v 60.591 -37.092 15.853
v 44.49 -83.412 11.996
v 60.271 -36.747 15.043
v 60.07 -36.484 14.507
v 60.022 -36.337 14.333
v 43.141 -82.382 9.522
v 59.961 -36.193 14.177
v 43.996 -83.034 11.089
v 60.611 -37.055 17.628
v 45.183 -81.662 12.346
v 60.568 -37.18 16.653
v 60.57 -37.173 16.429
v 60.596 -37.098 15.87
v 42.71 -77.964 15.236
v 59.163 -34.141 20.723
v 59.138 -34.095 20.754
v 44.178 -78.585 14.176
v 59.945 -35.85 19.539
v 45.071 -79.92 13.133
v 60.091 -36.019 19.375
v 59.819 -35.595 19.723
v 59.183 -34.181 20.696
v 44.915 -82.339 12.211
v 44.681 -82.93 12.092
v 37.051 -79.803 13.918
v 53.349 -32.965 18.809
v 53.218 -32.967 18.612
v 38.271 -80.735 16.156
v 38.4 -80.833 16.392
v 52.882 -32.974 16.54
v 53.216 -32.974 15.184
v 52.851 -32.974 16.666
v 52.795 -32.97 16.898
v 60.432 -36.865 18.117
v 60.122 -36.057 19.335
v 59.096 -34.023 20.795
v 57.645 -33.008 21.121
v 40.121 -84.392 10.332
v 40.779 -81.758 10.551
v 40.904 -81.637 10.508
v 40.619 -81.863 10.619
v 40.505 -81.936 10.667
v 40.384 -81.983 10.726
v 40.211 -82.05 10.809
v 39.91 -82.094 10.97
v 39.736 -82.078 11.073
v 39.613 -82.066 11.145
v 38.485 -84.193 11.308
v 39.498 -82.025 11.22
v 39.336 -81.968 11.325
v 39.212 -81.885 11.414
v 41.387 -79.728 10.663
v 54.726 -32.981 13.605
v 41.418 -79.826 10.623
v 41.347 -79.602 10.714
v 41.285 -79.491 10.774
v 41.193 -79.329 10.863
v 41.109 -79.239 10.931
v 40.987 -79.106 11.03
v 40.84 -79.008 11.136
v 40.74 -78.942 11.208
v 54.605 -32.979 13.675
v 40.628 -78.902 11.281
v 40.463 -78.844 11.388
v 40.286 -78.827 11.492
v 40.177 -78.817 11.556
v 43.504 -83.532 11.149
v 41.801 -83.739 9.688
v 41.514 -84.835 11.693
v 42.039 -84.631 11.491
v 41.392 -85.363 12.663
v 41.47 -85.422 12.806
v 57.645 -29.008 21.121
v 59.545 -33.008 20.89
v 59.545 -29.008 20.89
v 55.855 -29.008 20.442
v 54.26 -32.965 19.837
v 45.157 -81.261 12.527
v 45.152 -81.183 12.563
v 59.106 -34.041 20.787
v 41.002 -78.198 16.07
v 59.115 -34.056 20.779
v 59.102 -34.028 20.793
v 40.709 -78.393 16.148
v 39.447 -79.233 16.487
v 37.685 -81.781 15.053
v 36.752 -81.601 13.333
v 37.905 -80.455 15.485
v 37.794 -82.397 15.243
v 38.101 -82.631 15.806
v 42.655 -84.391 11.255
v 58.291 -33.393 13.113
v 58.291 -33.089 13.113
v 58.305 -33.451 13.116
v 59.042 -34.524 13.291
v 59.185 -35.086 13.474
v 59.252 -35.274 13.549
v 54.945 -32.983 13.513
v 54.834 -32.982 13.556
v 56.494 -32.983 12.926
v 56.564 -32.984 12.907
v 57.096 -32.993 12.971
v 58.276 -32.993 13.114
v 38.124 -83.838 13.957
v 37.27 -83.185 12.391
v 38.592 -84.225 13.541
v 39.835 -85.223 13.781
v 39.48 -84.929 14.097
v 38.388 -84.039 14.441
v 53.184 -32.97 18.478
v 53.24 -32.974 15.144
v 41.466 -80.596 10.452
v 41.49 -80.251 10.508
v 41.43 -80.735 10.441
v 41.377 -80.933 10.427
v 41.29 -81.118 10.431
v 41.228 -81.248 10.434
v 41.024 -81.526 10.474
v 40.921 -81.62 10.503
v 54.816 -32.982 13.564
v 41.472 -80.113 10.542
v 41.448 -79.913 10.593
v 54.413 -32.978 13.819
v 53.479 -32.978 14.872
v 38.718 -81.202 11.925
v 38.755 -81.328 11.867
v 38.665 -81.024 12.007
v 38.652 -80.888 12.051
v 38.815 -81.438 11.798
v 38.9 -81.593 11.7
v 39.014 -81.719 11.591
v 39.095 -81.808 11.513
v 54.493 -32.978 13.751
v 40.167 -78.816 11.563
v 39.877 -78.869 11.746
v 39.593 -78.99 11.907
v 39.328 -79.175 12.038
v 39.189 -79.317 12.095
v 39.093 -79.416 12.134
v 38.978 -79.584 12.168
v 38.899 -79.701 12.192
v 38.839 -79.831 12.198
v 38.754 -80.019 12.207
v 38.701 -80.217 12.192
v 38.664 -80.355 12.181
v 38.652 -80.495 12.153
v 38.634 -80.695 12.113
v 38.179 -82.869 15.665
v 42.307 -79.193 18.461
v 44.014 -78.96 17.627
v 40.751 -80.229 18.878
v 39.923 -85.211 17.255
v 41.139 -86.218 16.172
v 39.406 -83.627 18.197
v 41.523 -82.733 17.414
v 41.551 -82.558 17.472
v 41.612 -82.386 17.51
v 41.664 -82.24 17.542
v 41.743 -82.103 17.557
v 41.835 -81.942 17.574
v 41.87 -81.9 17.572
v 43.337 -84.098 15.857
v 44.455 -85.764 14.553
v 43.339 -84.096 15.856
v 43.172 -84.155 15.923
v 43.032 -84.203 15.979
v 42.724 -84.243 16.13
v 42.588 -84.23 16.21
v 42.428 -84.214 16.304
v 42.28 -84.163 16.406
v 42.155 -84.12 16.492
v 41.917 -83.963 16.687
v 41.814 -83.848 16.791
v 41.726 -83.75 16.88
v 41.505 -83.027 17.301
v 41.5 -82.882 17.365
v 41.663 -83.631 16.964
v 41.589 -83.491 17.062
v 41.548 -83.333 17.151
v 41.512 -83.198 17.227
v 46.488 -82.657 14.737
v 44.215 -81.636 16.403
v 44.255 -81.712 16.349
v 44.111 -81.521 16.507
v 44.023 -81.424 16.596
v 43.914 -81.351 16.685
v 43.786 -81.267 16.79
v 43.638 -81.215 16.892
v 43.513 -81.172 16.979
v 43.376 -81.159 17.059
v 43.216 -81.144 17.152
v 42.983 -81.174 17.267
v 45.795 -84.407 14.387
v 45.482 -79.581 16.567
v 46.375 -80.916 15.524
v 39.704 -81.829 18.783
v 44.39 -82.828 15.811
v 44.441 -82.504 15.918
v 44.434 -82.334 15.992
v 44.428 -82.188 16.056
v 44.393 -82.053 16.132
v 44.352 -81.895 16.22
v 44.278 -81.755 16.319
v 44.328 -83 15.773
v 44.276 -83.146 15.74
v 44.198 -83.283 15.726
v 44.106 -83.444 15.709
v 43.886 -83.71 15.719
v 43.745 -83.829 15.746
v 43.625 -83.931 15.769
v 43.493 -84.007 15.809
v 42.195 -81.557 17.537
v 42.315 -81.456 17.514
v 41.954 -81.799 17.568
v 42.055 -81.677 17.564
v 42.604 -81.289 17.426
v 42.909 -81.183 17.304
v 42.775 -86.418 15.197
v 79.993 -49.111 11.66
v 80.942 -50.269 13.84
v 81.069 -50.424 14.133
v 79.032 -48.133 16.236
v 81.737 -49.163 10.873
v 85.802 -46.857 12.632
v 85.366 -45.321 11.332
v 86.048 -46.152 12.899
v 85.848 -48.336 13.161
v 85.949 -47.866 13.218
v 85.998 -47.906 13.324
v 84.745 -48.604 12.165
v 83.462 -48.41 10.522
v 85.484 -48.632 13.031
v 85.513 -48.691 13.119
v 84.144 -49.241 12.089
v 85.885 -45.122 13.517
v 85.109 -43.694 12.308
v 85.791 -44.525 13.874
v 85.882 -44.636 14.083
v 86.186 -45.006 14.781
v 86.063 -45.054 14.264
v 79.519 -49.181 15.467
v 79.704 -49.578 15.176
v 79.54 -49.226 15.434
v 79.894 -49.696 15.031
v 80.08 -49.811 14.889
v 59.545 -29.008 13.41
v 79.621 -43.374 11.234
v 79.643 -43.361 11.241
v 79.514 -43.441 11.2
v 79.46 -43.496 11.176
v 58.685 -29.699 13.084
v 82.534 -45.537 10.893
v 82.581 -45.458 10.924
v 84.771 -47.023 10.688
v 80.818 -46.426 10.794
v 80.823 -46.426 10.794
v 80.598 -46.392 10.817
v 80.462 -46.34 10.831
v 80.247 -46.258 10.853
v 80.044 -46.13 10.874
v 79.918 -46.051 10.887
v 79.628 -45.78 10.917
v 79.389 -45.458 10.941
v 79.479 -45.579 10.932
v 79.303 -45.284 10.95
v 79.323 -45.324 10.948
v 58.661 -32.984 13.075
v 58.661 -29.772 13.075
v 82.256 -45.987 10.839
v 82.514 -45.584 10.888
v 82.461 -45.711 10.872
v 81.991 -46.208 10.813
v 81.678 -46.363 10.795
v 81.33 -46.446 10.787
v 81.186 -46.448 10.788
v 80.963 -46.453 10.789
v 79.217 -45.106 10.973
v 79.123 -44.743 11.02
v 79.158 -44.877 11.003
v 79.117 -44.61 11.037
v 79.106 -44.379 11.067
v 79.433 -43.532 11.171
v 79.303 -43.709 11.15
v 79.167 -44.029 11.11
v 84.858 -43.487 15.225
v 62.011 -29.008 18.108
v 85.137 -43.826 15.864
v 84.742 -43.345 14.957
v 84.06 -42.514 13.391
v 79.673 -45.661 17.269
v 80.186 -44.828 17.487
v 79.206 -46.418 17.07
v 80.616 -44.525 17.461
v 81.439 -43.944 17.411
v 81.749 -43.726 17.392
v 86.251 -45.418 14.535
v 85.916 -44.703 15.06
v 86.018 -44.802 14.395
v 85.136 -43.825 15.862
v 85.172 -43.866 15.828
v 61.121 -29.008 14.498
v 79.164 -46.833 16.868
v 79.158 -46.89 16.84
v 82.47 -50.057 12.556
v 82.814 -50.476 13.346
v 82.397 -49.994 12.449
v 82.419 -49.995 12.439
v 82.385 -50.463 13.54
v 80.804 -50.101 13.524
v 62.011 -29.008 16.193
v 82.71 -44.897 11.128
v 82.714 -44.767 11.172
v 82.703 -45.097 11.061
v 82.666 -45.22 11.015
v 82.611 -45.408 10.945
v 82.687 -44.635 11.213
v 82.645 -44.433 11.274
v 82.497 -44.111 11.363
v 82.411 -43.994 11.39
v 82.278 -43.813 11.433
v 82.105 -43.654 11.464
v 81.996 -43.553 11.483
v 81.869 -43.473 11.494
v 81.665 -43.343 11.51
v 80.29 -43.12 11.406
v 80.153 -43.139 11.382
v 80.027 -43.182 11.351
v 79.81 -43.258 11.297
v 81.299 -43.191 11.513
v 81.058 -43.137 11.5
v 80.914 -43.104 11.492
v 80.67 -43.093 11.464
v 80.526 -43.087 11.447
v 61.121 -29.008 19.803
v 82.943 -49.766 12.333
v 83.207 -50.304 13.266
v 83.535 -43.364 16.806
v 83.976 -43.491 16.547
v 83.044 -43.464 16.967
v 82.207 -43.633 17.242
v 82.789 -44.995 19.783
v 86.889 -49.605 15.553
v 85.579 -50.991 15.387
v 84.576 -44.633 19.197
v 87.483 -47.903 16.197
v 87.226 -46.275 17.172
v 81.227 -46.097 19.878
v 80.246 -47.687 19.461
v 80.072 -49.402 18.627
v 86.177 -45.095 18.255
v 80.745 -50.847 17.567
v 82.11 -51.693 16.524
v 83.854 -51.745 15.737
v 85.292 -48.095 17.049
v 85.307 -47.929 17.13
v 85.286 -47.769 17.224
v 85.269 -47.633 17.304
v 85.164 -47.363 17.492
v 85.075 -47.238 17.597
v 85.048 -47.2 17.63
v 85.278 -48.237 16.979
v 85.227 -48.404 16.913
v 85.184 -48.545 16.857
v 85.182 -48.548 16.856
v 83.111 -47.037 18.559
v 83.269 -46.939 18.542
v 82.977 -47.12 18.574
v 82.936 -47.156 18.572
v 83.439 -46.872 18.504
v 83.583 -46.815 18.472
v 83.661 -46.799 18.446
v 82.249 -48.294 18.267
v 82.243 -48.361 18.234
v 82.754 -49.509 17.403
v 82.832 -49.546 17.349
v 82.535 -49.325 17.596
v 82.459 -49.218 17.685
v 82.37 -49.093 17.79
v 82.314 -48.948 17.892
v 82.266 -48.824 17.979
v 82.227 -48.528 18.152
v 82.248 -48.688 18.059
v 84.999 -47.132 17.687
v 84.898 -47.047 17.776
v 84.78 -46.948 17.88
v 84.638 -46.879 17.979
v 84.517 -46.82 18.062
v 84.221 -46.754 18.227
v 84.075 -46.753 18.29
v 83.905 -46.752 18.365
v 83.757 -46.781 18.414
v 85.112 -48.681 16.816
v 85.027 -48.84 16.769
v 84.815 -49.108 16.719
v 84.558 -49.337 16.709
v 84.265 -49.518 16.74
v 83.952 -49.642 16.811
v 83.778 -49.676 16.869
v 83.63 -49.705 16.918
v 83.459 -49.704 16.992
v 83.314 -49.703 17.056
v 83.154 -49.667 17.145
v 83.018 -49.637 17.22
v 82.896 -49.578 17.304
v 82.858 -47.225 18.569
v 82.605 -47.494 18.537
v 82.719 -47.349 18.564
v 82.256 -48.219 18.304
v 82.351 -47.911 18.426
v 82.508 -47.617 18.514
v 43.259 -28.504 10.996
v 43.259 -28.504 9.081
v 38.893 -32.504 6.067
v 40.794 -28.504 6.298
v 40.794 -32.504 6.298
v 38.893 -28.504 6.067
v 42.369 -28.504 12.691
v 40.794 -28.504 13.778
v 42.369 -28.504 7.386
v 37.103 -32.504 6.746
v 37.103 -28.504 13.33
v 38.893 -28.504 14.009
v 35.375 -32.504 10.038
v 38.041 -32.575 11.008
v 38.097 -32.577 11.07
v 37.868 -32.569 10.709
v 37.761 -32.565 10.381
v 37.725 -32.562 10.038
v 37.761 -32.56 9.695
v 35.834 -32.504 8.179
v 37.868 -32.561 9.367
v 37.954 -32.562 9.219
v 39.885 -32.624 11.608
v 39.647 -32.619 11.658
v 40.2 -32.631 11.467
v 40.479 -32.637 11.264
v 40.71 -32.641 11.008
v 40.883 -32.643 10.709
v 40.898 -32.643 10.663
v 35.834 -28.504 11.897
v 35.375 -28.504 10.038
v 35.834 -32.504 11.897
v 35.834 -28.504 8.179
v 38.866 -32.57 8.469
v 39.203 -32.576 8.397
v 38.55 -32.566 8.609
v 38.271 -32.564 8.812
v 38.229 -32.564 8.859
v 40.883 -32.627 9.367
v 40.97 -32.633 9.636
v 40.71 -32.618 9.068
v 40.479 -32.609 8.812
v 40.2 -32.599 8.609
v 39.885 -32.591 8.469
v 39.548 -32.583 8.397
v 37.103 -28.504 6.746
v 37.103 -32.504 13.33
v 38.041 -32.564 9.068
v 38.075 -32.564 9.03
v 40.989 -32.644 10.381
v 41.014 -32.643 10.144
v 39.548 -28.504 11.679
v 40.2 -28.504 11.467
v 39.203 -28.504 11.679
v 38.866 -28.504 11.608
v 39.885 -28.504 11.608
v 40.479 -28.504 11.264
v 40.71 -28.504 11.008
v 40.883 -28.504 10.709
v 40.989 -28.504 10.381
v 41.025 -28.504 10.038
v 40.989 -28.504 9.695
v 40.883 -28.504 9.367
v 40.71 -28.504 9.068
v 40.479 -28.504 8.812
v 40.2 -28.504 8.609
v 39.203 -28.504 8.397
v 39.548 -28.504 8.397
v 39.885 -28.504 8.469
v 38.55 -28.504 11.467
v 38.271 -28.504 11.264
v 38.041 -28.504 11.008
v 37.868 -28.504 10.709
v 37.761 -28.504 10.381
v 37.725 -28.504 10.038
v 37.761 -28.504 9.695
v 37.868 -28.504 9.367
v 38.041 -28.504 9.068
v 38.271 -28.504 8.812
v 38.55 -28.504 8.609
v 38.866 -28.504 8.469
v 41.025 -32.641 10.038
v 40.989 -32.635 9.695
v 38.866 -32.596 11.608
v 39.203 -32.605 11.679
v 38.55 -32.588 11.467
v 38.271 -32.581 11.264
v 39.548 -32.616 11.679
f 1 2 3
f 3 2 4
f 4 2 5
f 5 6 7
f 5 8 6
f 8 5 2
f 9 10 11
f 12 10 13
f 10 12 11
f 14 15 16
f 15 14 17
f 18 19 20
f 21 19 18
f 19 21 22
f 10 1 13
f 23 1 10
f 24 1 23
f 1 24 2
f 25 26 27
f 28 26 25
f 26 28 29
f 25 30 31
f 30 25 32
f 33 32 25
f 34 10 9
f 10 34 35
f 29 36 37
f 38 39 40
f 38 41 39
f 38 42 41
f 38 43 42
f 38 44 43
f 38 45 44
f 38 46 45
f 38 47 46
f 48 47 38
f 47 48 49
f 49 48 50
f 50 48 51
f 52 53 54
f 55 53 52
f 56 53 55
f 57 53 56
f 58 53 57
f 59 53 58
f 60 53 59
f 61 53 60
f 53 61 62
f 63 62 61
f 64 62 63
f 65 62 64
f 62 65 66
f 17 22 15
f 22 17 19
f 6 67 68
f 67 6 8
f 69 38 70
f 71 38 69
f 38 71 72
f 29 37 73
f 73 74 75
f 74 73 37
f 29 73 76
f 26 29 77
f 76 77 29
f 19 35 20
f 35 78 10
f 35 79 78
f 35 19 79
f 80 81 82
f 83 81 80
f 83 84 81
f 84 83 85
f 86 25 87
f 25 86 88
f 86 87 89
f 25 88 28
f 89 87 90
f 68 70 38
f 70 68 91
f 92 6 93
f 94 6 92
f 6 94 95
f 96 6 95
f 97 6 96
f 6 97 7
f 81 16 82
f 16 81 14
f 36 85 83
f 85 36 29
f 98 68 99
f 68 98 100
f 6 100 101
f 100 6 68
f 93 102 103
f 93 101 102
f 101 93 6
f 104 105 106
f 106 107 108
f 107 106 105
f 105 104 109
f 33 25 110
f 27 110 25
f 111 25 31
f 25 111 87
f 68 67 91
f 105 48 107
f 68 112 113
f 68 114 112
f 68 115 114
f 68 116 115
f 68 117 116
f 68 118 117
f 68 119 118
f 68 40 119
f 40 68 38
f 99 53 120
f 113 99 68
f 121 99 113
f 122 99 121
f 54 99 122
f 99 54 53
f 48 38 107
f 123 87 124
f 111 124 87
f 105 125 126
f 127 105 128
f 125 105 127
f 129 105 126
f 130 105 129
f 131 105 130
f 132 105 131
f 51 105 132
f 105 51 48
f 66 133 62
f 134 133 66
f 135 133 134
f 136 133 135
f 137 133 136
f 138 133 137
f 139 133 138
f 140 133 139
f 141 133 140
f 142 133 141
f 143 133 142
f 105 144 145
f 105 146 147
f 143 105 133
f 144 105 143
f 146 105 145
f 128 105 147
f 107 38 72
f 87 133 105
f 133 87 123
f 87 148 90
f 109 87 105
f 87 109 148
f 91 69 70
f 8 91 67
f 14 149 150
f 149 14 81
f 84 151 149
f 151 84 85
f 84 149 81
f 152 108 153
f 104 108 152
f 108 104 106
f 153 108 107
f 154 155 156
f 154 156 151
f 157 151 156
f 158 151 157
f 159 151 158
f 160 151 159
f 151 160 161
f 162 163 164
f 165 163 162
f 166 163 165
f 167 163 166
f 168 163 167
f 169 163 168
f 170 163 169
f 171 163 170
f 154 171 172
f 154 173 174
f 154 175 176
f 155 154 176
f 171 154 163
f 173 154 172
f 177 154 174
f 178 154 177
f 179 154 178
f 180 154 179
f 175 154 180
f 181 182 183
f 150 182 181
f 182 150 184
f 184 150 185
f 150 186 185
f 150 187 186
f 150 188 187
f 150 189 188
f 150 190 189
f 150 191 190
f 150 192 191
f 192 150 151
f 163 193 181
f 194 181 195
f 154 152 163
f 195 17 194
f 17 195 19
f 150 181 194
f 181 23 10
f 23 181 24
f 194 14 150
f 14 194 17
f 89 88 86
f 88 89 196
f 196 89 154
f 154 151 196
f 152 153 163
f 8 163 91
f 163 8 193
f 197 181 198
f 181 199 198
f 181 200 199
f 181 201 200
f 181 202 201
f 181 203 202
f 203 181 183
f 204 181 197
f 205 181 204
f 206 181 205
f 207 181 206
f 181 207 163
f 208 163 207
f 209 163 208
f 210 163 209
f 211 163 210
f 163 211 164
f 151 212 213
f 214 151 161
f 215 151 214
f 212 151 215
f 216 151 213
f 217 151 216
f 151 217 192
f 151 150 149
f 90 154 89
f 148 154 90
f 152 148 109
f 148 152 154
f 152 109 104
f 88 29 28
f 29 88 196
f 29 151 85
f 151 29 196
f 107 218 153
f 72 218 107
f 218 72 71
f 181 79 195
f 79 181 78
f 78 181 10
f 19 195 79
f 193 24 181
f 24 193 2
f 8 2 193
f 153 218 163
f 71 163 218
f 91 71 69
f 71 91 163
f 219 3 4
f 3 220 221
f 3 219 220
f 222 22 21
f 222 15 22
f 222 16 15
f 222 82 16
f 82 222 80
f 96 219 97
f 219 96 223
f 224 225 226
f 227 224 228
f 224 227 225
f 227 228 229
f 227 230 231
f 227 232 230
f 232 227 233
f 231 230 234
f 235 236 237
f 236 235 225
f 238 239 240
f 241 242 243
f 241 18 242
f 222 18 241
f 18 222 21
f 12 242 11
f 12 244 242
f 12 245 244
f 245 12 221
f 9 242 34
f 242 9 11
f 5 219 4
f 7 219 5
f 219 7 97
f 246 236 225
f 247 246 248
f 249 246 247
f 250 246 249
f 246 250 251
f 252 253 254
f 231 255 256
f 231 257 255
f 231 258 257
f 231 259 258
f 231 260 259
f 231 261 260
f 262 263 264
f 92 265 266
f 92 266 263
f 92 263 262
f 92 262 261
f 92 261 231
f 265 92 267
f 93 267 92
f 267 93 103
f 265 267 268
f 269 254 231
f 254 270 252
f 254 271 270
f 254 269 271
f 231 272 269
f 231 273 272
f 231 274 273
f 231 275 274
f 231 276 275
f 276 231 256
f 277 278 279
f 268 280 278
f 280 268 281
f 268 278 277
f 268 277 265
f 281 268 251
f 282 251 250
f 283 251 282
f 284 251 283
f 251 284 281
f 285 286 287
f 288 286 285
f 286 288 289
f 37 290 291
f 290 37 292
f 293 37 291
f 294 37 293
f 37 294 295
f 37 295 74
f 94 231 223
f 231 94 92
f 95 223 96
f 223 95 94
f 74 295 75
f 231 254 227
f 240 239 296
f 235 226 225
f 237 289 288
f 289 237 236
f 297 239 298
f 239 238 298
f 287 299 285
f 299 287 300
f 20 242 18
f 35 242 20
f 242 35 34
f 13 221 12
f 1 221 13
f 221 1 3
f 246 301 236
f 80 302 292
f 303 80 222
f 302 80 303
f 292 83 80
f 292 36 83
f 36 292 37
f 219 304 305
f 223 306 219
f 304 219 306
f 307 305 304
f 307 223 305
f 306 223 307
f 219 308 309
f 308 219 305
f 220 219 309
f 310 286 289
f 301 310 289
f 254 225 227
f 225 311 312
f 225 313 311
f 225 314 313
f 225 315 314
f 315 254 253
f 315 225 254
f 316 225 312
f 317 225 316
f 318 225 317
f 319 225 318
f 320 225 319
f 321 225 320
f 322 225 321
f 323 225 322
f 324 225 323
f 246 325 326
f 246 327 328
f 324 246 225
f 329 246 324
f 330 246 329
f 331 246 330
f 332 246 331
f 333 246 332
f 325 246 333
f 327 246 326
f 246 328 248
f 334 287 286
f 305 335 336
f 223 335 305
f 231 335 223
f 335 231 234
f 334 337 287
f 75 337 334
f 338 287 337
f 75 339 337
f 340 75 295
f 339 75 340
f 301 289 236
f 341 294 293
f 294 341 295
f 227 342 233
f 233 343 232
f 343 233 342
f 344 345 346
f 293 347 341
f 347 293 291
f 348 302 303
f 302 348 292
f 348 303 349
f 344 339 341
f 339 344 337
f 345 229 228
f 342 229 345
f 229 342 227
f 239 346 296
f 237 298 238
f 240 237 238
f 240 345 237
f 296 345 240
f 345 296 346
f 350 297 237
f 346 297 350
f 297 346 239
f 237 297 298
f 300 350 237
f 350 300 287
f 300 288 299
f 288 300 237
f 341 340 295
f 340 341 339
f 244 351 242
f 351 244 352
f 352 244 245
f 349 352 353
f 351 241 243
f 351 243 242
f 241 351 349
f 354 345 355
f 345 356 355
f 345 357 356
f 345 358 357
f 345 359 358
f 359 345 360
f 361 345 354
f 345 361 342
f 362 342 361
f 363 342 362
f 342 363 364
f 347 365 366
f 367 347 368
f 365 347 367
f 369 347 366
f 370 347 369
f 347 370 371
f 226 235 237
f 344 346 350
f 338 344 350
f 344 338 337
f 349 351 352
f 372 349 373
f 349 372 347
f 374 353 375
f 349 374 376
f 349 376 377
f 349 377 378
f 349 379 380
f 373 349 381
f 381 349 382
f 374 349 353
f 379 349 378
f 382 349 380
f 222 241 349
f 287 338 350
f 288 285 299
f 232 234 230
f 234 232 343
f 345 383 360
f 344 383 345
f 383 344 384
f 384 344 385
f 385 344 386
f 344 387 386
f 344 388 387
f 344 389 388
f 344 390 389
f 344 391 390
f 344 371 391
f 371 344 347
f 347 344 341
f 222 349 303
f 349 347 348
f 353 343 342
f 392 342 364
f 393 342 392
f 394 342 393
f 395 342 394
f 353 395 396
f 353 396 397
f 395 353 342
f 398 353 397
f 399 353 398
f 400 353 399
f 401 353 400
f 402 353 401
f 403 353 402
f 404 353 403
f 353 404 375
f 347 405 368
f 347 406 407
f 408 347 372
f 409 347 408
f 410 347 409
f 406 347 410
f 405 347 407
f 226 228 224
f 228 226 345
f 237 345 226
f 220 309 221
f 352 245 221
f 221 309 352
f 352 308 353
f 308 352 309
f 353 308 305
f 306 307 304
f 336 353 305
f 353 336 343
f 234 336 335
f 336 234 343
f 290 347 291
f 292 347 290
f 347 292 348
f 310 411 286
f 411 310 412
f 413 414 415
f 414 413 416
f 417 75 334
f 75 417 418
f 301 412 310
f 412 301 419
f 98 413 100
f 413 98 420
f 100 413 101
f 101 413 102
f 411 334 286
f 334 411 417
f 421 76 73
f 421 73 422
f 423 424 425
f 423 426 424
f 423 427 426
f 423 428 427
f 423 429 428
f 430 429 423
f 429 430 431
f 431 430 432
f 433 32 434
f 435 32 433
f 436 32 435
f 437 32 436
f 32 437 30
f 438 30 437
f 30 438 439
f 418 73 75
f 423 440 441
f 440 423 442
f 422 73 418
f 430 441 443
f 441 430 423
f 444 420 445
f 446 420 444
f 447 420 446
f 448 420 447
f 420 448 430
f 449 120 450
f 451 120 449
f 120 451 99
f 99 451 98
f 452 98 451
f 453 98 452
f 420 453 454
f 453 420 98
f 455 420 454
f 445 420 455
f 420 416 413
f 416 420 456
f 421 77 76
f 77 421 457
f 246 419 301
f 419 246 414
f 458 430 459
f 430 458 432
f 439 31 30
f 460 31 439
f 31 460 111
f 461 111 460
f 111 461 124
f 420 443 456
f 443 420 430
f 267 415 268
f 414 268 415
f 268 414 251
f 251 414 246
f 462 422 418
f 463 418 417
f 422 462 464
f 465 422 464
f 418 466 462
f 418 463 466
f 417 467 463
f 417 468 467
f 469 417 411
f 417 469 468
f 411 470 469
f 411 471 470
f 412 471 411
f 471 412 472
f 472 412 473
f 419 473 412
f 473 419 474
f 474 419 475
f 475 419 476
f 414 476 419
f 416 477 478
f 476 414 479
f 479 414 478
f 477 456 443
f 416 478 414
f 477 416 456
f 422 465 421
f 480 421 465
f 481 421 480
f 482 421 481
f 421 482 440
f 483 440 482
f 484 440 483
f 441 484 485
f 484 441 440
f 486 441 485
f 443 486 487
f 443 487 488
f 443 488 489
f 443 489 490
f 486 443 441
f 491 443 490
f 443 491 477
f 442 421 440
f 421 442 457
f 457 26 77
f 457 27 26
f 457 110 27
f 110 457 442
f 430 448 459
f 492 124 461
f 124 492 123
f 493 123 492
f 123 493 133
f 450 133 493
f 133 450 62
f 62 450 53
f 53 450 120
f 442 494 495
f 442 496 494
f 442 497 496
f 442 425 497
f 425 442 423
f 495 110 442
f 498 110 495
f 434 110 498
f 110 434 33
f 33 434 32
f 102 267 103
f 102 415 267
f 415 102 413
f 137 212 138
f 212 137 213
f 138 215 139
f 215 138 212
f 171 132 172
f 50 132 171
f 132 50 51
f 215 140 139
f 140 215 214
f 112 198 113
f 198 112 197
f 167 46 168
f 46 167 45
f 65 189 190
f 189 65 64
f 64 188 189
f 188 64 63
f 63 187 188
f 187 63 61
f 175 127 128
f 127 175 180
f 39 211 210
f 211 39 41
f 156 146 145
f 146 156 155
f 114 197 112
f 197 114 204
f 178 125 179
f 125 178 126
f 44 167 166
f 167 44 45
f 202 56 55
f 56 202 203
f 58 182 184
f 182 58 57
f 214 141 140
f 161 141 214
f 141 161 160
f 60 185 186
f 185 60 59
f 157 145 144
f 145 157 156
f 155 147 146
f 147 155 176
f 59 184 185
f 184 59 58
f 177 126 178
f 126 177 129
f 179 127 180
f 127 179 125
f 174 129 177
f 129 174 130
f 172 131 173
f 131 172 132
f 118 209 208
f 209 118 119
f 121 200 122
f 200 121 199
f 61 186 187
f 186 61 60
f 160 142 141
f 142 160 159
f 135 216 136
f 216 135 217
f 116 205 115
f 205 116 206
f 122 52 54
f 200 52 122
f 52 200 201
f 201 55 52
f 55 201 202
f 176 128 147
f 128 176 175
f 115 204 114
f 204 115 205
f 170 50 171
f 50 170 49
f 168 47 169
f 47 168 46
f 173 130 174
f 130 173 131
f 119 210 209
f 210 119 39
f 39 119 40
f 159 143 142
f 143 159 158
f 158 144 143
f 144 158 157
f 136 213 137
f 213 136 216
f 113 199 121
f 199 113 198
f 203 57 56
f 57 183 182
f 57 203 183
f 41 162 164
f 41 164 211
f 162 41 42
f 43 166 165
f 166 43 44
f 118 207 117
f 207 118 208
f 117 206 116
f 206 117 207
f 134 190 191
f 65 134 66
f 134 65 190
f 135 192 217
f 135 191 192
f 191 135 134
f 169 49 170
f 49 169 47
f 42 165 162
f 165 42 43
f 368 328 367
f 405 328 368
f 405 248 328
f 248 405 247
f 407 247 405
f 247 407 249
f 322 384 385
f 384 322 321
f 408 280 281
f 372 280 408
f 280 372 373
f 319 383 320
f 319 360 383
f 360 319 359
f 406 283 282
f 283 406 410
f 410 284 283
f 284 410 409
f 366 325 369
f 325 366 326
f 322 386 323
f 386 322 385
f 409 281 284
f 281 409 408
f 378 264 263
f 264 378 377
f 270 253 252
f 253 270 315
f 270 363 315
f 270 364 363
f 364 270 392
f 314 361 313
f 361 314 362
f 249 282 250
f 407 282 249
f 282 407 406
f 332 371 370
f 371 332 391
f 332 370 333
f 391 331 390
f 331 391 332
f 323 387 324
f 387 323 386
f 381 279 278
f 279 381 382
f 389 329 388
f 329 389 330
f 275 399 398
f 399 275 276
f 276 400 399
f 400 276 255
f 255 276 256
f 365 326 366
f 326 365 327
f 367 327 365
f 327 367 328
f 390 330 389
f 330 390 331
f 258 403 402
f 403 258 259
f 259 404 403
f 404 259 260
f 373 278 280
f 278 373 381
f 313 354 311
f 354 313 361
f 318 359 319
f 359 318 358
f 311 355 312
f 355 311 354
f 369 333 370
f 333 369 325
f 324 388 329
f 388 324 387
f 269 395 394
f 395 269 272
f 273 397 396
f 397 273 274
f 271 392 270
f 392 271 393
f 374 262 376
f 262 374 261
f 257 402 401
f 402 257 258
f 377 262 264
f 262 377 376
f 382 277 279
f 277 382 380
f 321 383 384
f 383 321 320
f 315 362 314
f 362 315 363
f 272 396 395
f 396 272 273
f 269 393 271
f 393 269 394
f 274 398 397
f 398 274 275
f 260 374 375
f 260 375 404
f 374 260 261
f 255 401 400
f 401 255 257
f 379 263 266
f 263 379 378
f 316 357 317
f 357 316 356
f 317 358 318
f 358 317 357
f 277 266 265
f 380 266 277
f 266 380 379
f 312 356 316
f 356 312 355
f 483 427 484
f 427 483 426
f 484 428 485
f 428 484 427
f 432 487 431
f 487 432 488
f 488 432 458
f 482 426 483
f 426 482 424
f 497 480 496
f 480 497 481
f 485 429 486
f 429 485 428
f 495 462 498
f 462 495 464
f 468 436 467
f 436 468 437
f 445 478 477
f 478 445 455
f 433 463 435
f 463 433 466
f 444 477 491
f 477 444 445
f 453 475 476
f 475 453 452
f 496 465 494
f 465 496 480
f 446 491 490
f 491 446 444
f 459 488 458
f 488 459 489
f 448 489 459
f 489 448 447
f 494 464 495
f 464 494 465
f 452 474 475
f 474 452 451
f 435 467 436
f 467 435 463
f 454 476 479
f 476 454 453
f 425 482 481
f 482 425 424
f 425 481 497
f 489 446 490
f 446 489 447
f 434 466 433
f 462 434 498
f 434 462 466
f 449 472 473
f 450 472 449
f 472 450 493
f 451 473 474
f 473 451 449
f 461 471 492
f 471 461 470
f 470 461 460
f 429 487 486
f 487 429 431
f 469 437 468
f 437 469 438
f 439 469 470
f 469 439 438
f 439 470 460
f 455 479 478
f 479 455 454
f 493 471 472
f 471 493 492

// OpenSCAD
mirror ([-1, 0, 0]) {
  difference () {
    union () {
      hull () {
        translate ([-58.12688631393563, -31.007811226975093, 17.150286004287032]) {
          rotate (a=90.0, v=[1, 0, 0]) {
            cylinder (h=4, r=4, center=true);
          }
        }
        translate ([-29, -40, -13]) {
          translate ([-23.517243753340196, -33.10409381688861, 28.547426434629916]) {
            rotate (a=48.00000000000001, v=[0, 0, 1]) {
              rotate (a=-34.0, v=[0, 1, 0]) {
                rotate (a=-6.0, v=[1, 0, 0]) {
                  translate ([0, 0, -4.5]) {
                    translate ([0, -13.575, 0]) {
                      cylinder (h=3, r=4, center=true);
                    }
                  }
                }
              }
            }
          }
        }
      }
      translate ([-29, -40, -13]) {
        translate ([-23.517243753340196, -33.10409381688861, 28.547426434629916]) {
          rotate (a=48.00000000000001, v=[0, 0, 1]) {
            rotate (a=-34.0, v=[0, 1, 0]) {
              rotate (a=-6.0, v=[1, 0, 0]) {
                translate ([0, 0, -2.0999999999999996]) {
                  translate ([0, -13.575, 0]) {
                    cylinder (h=4, r=4, center=true);
                  }
                }
              }
            }
          }
        }
      }
      hull () {
        translate ([-58.12688631393563, -31.007811226975093, 17.150286004287032]) {
          rotate (a=90.0, v=[1, 0, 0]) {
            cylinder (h=4, r=4, center=true);
          }
        }
        translate ([-51, -25, -12]) {
          translate ([-23.517243753340196, -33.10409381688861, 28.547426434629916]) {
            rotate (a=40.0, v=[0, 0, 1]) {
              rotate (a=-34.0, v=[0, 1, 0]) {
                rotate (a=6.0, v=[1, 0, 0]) {
                  translate ([0, 0, -4.5]) {
                    translate ([0, 13.575, 0]) {
                      cylinder (h=3, r=4, center=true);
                    }
                  }
                }
              }
            }
          }
        }
      }
      translate ([-51, -25, -12]) {
        translate ([-23.517243753340196, -33.10409381688861, 28.547426434629916]) {
          rotate (a=40.0, v=[0, 0, 1]) {
            rotate (a=-34.0, v=[0, 1, 0]) {
              rotate (a=6.0, v=[1, 0, 0]) {
                translate ([0, 0, -2.0999999999999996]) {
                  translate ([0, 13.575, 0]) {
                    cylinder (h=4, r=4, center=true);
                  }
                }
              }
            }
          }
        }
      }
      hull () {
        translate ([-58.12688631393563, -31.007811226975093, 17.150286004287032]) {
          rotate (a=90.0, v=[1, 0, 0]) {
            cylinder (h=4, r=4, center=true);
          }
        }
        translate ([0, 4, 0]) {
          translate ([-39.37541674104513, -34.50390561348755, 10.038272992958468]) {
            rotate (a=90.0, v=[1, 0, 0]) {
              cylinder (h=4, r=4, center=true);
            }
          }
        }
      }
    }
    union () {
      translate ([-29, -40, -13]) {
        translate ([-23.517243753340196, -33.10409381688861, 28.547426434629916]) {
          rotate (a=48.00000000000001, v=[0, 0, 1]) {
            rotate (a=-34.0, v=[0, 1, 0]) {
              rotate (a=-6.0, v=[1, 0, 0]) {
                translate ([0, 0, -2.0999999999999996]) {
                  translate ([0, -13.575, 0]) {
                    cylinder ($fn=30, h=50, r=1.65, center=true);
                  }
                }
              }
            }
          }
        }
      }
      translate ([-51, -25, -12]) {
        translate ([-23.517243753340196, -33.10409381688861, 28.547426434629916]) {
          rotate (a=40.0, v=[0, 0, 1]) {
            rotate (a=-34.0, v=[0, 1, 0]) {
              rotate (a=6.0, v=[1, 0, 0]) {
                translate ([0, 0, -2.0999999999999996]) {
                  translate ([0, 13.575, 0]) {
                    cylinder ($fn=30, h=50, r=1.65, center=true);
                  }
                }
              }
            }
          }
        }
      }
      translate ([-39.37541674104513, -34.50390561348755, 10.038272992958468]) {
        rotate (a=90.0, v=[1, 0, 0]) {
          cylinder ($fn=30, h=50, r=1.65, center=true);
        }
      }
    }
  }
}
